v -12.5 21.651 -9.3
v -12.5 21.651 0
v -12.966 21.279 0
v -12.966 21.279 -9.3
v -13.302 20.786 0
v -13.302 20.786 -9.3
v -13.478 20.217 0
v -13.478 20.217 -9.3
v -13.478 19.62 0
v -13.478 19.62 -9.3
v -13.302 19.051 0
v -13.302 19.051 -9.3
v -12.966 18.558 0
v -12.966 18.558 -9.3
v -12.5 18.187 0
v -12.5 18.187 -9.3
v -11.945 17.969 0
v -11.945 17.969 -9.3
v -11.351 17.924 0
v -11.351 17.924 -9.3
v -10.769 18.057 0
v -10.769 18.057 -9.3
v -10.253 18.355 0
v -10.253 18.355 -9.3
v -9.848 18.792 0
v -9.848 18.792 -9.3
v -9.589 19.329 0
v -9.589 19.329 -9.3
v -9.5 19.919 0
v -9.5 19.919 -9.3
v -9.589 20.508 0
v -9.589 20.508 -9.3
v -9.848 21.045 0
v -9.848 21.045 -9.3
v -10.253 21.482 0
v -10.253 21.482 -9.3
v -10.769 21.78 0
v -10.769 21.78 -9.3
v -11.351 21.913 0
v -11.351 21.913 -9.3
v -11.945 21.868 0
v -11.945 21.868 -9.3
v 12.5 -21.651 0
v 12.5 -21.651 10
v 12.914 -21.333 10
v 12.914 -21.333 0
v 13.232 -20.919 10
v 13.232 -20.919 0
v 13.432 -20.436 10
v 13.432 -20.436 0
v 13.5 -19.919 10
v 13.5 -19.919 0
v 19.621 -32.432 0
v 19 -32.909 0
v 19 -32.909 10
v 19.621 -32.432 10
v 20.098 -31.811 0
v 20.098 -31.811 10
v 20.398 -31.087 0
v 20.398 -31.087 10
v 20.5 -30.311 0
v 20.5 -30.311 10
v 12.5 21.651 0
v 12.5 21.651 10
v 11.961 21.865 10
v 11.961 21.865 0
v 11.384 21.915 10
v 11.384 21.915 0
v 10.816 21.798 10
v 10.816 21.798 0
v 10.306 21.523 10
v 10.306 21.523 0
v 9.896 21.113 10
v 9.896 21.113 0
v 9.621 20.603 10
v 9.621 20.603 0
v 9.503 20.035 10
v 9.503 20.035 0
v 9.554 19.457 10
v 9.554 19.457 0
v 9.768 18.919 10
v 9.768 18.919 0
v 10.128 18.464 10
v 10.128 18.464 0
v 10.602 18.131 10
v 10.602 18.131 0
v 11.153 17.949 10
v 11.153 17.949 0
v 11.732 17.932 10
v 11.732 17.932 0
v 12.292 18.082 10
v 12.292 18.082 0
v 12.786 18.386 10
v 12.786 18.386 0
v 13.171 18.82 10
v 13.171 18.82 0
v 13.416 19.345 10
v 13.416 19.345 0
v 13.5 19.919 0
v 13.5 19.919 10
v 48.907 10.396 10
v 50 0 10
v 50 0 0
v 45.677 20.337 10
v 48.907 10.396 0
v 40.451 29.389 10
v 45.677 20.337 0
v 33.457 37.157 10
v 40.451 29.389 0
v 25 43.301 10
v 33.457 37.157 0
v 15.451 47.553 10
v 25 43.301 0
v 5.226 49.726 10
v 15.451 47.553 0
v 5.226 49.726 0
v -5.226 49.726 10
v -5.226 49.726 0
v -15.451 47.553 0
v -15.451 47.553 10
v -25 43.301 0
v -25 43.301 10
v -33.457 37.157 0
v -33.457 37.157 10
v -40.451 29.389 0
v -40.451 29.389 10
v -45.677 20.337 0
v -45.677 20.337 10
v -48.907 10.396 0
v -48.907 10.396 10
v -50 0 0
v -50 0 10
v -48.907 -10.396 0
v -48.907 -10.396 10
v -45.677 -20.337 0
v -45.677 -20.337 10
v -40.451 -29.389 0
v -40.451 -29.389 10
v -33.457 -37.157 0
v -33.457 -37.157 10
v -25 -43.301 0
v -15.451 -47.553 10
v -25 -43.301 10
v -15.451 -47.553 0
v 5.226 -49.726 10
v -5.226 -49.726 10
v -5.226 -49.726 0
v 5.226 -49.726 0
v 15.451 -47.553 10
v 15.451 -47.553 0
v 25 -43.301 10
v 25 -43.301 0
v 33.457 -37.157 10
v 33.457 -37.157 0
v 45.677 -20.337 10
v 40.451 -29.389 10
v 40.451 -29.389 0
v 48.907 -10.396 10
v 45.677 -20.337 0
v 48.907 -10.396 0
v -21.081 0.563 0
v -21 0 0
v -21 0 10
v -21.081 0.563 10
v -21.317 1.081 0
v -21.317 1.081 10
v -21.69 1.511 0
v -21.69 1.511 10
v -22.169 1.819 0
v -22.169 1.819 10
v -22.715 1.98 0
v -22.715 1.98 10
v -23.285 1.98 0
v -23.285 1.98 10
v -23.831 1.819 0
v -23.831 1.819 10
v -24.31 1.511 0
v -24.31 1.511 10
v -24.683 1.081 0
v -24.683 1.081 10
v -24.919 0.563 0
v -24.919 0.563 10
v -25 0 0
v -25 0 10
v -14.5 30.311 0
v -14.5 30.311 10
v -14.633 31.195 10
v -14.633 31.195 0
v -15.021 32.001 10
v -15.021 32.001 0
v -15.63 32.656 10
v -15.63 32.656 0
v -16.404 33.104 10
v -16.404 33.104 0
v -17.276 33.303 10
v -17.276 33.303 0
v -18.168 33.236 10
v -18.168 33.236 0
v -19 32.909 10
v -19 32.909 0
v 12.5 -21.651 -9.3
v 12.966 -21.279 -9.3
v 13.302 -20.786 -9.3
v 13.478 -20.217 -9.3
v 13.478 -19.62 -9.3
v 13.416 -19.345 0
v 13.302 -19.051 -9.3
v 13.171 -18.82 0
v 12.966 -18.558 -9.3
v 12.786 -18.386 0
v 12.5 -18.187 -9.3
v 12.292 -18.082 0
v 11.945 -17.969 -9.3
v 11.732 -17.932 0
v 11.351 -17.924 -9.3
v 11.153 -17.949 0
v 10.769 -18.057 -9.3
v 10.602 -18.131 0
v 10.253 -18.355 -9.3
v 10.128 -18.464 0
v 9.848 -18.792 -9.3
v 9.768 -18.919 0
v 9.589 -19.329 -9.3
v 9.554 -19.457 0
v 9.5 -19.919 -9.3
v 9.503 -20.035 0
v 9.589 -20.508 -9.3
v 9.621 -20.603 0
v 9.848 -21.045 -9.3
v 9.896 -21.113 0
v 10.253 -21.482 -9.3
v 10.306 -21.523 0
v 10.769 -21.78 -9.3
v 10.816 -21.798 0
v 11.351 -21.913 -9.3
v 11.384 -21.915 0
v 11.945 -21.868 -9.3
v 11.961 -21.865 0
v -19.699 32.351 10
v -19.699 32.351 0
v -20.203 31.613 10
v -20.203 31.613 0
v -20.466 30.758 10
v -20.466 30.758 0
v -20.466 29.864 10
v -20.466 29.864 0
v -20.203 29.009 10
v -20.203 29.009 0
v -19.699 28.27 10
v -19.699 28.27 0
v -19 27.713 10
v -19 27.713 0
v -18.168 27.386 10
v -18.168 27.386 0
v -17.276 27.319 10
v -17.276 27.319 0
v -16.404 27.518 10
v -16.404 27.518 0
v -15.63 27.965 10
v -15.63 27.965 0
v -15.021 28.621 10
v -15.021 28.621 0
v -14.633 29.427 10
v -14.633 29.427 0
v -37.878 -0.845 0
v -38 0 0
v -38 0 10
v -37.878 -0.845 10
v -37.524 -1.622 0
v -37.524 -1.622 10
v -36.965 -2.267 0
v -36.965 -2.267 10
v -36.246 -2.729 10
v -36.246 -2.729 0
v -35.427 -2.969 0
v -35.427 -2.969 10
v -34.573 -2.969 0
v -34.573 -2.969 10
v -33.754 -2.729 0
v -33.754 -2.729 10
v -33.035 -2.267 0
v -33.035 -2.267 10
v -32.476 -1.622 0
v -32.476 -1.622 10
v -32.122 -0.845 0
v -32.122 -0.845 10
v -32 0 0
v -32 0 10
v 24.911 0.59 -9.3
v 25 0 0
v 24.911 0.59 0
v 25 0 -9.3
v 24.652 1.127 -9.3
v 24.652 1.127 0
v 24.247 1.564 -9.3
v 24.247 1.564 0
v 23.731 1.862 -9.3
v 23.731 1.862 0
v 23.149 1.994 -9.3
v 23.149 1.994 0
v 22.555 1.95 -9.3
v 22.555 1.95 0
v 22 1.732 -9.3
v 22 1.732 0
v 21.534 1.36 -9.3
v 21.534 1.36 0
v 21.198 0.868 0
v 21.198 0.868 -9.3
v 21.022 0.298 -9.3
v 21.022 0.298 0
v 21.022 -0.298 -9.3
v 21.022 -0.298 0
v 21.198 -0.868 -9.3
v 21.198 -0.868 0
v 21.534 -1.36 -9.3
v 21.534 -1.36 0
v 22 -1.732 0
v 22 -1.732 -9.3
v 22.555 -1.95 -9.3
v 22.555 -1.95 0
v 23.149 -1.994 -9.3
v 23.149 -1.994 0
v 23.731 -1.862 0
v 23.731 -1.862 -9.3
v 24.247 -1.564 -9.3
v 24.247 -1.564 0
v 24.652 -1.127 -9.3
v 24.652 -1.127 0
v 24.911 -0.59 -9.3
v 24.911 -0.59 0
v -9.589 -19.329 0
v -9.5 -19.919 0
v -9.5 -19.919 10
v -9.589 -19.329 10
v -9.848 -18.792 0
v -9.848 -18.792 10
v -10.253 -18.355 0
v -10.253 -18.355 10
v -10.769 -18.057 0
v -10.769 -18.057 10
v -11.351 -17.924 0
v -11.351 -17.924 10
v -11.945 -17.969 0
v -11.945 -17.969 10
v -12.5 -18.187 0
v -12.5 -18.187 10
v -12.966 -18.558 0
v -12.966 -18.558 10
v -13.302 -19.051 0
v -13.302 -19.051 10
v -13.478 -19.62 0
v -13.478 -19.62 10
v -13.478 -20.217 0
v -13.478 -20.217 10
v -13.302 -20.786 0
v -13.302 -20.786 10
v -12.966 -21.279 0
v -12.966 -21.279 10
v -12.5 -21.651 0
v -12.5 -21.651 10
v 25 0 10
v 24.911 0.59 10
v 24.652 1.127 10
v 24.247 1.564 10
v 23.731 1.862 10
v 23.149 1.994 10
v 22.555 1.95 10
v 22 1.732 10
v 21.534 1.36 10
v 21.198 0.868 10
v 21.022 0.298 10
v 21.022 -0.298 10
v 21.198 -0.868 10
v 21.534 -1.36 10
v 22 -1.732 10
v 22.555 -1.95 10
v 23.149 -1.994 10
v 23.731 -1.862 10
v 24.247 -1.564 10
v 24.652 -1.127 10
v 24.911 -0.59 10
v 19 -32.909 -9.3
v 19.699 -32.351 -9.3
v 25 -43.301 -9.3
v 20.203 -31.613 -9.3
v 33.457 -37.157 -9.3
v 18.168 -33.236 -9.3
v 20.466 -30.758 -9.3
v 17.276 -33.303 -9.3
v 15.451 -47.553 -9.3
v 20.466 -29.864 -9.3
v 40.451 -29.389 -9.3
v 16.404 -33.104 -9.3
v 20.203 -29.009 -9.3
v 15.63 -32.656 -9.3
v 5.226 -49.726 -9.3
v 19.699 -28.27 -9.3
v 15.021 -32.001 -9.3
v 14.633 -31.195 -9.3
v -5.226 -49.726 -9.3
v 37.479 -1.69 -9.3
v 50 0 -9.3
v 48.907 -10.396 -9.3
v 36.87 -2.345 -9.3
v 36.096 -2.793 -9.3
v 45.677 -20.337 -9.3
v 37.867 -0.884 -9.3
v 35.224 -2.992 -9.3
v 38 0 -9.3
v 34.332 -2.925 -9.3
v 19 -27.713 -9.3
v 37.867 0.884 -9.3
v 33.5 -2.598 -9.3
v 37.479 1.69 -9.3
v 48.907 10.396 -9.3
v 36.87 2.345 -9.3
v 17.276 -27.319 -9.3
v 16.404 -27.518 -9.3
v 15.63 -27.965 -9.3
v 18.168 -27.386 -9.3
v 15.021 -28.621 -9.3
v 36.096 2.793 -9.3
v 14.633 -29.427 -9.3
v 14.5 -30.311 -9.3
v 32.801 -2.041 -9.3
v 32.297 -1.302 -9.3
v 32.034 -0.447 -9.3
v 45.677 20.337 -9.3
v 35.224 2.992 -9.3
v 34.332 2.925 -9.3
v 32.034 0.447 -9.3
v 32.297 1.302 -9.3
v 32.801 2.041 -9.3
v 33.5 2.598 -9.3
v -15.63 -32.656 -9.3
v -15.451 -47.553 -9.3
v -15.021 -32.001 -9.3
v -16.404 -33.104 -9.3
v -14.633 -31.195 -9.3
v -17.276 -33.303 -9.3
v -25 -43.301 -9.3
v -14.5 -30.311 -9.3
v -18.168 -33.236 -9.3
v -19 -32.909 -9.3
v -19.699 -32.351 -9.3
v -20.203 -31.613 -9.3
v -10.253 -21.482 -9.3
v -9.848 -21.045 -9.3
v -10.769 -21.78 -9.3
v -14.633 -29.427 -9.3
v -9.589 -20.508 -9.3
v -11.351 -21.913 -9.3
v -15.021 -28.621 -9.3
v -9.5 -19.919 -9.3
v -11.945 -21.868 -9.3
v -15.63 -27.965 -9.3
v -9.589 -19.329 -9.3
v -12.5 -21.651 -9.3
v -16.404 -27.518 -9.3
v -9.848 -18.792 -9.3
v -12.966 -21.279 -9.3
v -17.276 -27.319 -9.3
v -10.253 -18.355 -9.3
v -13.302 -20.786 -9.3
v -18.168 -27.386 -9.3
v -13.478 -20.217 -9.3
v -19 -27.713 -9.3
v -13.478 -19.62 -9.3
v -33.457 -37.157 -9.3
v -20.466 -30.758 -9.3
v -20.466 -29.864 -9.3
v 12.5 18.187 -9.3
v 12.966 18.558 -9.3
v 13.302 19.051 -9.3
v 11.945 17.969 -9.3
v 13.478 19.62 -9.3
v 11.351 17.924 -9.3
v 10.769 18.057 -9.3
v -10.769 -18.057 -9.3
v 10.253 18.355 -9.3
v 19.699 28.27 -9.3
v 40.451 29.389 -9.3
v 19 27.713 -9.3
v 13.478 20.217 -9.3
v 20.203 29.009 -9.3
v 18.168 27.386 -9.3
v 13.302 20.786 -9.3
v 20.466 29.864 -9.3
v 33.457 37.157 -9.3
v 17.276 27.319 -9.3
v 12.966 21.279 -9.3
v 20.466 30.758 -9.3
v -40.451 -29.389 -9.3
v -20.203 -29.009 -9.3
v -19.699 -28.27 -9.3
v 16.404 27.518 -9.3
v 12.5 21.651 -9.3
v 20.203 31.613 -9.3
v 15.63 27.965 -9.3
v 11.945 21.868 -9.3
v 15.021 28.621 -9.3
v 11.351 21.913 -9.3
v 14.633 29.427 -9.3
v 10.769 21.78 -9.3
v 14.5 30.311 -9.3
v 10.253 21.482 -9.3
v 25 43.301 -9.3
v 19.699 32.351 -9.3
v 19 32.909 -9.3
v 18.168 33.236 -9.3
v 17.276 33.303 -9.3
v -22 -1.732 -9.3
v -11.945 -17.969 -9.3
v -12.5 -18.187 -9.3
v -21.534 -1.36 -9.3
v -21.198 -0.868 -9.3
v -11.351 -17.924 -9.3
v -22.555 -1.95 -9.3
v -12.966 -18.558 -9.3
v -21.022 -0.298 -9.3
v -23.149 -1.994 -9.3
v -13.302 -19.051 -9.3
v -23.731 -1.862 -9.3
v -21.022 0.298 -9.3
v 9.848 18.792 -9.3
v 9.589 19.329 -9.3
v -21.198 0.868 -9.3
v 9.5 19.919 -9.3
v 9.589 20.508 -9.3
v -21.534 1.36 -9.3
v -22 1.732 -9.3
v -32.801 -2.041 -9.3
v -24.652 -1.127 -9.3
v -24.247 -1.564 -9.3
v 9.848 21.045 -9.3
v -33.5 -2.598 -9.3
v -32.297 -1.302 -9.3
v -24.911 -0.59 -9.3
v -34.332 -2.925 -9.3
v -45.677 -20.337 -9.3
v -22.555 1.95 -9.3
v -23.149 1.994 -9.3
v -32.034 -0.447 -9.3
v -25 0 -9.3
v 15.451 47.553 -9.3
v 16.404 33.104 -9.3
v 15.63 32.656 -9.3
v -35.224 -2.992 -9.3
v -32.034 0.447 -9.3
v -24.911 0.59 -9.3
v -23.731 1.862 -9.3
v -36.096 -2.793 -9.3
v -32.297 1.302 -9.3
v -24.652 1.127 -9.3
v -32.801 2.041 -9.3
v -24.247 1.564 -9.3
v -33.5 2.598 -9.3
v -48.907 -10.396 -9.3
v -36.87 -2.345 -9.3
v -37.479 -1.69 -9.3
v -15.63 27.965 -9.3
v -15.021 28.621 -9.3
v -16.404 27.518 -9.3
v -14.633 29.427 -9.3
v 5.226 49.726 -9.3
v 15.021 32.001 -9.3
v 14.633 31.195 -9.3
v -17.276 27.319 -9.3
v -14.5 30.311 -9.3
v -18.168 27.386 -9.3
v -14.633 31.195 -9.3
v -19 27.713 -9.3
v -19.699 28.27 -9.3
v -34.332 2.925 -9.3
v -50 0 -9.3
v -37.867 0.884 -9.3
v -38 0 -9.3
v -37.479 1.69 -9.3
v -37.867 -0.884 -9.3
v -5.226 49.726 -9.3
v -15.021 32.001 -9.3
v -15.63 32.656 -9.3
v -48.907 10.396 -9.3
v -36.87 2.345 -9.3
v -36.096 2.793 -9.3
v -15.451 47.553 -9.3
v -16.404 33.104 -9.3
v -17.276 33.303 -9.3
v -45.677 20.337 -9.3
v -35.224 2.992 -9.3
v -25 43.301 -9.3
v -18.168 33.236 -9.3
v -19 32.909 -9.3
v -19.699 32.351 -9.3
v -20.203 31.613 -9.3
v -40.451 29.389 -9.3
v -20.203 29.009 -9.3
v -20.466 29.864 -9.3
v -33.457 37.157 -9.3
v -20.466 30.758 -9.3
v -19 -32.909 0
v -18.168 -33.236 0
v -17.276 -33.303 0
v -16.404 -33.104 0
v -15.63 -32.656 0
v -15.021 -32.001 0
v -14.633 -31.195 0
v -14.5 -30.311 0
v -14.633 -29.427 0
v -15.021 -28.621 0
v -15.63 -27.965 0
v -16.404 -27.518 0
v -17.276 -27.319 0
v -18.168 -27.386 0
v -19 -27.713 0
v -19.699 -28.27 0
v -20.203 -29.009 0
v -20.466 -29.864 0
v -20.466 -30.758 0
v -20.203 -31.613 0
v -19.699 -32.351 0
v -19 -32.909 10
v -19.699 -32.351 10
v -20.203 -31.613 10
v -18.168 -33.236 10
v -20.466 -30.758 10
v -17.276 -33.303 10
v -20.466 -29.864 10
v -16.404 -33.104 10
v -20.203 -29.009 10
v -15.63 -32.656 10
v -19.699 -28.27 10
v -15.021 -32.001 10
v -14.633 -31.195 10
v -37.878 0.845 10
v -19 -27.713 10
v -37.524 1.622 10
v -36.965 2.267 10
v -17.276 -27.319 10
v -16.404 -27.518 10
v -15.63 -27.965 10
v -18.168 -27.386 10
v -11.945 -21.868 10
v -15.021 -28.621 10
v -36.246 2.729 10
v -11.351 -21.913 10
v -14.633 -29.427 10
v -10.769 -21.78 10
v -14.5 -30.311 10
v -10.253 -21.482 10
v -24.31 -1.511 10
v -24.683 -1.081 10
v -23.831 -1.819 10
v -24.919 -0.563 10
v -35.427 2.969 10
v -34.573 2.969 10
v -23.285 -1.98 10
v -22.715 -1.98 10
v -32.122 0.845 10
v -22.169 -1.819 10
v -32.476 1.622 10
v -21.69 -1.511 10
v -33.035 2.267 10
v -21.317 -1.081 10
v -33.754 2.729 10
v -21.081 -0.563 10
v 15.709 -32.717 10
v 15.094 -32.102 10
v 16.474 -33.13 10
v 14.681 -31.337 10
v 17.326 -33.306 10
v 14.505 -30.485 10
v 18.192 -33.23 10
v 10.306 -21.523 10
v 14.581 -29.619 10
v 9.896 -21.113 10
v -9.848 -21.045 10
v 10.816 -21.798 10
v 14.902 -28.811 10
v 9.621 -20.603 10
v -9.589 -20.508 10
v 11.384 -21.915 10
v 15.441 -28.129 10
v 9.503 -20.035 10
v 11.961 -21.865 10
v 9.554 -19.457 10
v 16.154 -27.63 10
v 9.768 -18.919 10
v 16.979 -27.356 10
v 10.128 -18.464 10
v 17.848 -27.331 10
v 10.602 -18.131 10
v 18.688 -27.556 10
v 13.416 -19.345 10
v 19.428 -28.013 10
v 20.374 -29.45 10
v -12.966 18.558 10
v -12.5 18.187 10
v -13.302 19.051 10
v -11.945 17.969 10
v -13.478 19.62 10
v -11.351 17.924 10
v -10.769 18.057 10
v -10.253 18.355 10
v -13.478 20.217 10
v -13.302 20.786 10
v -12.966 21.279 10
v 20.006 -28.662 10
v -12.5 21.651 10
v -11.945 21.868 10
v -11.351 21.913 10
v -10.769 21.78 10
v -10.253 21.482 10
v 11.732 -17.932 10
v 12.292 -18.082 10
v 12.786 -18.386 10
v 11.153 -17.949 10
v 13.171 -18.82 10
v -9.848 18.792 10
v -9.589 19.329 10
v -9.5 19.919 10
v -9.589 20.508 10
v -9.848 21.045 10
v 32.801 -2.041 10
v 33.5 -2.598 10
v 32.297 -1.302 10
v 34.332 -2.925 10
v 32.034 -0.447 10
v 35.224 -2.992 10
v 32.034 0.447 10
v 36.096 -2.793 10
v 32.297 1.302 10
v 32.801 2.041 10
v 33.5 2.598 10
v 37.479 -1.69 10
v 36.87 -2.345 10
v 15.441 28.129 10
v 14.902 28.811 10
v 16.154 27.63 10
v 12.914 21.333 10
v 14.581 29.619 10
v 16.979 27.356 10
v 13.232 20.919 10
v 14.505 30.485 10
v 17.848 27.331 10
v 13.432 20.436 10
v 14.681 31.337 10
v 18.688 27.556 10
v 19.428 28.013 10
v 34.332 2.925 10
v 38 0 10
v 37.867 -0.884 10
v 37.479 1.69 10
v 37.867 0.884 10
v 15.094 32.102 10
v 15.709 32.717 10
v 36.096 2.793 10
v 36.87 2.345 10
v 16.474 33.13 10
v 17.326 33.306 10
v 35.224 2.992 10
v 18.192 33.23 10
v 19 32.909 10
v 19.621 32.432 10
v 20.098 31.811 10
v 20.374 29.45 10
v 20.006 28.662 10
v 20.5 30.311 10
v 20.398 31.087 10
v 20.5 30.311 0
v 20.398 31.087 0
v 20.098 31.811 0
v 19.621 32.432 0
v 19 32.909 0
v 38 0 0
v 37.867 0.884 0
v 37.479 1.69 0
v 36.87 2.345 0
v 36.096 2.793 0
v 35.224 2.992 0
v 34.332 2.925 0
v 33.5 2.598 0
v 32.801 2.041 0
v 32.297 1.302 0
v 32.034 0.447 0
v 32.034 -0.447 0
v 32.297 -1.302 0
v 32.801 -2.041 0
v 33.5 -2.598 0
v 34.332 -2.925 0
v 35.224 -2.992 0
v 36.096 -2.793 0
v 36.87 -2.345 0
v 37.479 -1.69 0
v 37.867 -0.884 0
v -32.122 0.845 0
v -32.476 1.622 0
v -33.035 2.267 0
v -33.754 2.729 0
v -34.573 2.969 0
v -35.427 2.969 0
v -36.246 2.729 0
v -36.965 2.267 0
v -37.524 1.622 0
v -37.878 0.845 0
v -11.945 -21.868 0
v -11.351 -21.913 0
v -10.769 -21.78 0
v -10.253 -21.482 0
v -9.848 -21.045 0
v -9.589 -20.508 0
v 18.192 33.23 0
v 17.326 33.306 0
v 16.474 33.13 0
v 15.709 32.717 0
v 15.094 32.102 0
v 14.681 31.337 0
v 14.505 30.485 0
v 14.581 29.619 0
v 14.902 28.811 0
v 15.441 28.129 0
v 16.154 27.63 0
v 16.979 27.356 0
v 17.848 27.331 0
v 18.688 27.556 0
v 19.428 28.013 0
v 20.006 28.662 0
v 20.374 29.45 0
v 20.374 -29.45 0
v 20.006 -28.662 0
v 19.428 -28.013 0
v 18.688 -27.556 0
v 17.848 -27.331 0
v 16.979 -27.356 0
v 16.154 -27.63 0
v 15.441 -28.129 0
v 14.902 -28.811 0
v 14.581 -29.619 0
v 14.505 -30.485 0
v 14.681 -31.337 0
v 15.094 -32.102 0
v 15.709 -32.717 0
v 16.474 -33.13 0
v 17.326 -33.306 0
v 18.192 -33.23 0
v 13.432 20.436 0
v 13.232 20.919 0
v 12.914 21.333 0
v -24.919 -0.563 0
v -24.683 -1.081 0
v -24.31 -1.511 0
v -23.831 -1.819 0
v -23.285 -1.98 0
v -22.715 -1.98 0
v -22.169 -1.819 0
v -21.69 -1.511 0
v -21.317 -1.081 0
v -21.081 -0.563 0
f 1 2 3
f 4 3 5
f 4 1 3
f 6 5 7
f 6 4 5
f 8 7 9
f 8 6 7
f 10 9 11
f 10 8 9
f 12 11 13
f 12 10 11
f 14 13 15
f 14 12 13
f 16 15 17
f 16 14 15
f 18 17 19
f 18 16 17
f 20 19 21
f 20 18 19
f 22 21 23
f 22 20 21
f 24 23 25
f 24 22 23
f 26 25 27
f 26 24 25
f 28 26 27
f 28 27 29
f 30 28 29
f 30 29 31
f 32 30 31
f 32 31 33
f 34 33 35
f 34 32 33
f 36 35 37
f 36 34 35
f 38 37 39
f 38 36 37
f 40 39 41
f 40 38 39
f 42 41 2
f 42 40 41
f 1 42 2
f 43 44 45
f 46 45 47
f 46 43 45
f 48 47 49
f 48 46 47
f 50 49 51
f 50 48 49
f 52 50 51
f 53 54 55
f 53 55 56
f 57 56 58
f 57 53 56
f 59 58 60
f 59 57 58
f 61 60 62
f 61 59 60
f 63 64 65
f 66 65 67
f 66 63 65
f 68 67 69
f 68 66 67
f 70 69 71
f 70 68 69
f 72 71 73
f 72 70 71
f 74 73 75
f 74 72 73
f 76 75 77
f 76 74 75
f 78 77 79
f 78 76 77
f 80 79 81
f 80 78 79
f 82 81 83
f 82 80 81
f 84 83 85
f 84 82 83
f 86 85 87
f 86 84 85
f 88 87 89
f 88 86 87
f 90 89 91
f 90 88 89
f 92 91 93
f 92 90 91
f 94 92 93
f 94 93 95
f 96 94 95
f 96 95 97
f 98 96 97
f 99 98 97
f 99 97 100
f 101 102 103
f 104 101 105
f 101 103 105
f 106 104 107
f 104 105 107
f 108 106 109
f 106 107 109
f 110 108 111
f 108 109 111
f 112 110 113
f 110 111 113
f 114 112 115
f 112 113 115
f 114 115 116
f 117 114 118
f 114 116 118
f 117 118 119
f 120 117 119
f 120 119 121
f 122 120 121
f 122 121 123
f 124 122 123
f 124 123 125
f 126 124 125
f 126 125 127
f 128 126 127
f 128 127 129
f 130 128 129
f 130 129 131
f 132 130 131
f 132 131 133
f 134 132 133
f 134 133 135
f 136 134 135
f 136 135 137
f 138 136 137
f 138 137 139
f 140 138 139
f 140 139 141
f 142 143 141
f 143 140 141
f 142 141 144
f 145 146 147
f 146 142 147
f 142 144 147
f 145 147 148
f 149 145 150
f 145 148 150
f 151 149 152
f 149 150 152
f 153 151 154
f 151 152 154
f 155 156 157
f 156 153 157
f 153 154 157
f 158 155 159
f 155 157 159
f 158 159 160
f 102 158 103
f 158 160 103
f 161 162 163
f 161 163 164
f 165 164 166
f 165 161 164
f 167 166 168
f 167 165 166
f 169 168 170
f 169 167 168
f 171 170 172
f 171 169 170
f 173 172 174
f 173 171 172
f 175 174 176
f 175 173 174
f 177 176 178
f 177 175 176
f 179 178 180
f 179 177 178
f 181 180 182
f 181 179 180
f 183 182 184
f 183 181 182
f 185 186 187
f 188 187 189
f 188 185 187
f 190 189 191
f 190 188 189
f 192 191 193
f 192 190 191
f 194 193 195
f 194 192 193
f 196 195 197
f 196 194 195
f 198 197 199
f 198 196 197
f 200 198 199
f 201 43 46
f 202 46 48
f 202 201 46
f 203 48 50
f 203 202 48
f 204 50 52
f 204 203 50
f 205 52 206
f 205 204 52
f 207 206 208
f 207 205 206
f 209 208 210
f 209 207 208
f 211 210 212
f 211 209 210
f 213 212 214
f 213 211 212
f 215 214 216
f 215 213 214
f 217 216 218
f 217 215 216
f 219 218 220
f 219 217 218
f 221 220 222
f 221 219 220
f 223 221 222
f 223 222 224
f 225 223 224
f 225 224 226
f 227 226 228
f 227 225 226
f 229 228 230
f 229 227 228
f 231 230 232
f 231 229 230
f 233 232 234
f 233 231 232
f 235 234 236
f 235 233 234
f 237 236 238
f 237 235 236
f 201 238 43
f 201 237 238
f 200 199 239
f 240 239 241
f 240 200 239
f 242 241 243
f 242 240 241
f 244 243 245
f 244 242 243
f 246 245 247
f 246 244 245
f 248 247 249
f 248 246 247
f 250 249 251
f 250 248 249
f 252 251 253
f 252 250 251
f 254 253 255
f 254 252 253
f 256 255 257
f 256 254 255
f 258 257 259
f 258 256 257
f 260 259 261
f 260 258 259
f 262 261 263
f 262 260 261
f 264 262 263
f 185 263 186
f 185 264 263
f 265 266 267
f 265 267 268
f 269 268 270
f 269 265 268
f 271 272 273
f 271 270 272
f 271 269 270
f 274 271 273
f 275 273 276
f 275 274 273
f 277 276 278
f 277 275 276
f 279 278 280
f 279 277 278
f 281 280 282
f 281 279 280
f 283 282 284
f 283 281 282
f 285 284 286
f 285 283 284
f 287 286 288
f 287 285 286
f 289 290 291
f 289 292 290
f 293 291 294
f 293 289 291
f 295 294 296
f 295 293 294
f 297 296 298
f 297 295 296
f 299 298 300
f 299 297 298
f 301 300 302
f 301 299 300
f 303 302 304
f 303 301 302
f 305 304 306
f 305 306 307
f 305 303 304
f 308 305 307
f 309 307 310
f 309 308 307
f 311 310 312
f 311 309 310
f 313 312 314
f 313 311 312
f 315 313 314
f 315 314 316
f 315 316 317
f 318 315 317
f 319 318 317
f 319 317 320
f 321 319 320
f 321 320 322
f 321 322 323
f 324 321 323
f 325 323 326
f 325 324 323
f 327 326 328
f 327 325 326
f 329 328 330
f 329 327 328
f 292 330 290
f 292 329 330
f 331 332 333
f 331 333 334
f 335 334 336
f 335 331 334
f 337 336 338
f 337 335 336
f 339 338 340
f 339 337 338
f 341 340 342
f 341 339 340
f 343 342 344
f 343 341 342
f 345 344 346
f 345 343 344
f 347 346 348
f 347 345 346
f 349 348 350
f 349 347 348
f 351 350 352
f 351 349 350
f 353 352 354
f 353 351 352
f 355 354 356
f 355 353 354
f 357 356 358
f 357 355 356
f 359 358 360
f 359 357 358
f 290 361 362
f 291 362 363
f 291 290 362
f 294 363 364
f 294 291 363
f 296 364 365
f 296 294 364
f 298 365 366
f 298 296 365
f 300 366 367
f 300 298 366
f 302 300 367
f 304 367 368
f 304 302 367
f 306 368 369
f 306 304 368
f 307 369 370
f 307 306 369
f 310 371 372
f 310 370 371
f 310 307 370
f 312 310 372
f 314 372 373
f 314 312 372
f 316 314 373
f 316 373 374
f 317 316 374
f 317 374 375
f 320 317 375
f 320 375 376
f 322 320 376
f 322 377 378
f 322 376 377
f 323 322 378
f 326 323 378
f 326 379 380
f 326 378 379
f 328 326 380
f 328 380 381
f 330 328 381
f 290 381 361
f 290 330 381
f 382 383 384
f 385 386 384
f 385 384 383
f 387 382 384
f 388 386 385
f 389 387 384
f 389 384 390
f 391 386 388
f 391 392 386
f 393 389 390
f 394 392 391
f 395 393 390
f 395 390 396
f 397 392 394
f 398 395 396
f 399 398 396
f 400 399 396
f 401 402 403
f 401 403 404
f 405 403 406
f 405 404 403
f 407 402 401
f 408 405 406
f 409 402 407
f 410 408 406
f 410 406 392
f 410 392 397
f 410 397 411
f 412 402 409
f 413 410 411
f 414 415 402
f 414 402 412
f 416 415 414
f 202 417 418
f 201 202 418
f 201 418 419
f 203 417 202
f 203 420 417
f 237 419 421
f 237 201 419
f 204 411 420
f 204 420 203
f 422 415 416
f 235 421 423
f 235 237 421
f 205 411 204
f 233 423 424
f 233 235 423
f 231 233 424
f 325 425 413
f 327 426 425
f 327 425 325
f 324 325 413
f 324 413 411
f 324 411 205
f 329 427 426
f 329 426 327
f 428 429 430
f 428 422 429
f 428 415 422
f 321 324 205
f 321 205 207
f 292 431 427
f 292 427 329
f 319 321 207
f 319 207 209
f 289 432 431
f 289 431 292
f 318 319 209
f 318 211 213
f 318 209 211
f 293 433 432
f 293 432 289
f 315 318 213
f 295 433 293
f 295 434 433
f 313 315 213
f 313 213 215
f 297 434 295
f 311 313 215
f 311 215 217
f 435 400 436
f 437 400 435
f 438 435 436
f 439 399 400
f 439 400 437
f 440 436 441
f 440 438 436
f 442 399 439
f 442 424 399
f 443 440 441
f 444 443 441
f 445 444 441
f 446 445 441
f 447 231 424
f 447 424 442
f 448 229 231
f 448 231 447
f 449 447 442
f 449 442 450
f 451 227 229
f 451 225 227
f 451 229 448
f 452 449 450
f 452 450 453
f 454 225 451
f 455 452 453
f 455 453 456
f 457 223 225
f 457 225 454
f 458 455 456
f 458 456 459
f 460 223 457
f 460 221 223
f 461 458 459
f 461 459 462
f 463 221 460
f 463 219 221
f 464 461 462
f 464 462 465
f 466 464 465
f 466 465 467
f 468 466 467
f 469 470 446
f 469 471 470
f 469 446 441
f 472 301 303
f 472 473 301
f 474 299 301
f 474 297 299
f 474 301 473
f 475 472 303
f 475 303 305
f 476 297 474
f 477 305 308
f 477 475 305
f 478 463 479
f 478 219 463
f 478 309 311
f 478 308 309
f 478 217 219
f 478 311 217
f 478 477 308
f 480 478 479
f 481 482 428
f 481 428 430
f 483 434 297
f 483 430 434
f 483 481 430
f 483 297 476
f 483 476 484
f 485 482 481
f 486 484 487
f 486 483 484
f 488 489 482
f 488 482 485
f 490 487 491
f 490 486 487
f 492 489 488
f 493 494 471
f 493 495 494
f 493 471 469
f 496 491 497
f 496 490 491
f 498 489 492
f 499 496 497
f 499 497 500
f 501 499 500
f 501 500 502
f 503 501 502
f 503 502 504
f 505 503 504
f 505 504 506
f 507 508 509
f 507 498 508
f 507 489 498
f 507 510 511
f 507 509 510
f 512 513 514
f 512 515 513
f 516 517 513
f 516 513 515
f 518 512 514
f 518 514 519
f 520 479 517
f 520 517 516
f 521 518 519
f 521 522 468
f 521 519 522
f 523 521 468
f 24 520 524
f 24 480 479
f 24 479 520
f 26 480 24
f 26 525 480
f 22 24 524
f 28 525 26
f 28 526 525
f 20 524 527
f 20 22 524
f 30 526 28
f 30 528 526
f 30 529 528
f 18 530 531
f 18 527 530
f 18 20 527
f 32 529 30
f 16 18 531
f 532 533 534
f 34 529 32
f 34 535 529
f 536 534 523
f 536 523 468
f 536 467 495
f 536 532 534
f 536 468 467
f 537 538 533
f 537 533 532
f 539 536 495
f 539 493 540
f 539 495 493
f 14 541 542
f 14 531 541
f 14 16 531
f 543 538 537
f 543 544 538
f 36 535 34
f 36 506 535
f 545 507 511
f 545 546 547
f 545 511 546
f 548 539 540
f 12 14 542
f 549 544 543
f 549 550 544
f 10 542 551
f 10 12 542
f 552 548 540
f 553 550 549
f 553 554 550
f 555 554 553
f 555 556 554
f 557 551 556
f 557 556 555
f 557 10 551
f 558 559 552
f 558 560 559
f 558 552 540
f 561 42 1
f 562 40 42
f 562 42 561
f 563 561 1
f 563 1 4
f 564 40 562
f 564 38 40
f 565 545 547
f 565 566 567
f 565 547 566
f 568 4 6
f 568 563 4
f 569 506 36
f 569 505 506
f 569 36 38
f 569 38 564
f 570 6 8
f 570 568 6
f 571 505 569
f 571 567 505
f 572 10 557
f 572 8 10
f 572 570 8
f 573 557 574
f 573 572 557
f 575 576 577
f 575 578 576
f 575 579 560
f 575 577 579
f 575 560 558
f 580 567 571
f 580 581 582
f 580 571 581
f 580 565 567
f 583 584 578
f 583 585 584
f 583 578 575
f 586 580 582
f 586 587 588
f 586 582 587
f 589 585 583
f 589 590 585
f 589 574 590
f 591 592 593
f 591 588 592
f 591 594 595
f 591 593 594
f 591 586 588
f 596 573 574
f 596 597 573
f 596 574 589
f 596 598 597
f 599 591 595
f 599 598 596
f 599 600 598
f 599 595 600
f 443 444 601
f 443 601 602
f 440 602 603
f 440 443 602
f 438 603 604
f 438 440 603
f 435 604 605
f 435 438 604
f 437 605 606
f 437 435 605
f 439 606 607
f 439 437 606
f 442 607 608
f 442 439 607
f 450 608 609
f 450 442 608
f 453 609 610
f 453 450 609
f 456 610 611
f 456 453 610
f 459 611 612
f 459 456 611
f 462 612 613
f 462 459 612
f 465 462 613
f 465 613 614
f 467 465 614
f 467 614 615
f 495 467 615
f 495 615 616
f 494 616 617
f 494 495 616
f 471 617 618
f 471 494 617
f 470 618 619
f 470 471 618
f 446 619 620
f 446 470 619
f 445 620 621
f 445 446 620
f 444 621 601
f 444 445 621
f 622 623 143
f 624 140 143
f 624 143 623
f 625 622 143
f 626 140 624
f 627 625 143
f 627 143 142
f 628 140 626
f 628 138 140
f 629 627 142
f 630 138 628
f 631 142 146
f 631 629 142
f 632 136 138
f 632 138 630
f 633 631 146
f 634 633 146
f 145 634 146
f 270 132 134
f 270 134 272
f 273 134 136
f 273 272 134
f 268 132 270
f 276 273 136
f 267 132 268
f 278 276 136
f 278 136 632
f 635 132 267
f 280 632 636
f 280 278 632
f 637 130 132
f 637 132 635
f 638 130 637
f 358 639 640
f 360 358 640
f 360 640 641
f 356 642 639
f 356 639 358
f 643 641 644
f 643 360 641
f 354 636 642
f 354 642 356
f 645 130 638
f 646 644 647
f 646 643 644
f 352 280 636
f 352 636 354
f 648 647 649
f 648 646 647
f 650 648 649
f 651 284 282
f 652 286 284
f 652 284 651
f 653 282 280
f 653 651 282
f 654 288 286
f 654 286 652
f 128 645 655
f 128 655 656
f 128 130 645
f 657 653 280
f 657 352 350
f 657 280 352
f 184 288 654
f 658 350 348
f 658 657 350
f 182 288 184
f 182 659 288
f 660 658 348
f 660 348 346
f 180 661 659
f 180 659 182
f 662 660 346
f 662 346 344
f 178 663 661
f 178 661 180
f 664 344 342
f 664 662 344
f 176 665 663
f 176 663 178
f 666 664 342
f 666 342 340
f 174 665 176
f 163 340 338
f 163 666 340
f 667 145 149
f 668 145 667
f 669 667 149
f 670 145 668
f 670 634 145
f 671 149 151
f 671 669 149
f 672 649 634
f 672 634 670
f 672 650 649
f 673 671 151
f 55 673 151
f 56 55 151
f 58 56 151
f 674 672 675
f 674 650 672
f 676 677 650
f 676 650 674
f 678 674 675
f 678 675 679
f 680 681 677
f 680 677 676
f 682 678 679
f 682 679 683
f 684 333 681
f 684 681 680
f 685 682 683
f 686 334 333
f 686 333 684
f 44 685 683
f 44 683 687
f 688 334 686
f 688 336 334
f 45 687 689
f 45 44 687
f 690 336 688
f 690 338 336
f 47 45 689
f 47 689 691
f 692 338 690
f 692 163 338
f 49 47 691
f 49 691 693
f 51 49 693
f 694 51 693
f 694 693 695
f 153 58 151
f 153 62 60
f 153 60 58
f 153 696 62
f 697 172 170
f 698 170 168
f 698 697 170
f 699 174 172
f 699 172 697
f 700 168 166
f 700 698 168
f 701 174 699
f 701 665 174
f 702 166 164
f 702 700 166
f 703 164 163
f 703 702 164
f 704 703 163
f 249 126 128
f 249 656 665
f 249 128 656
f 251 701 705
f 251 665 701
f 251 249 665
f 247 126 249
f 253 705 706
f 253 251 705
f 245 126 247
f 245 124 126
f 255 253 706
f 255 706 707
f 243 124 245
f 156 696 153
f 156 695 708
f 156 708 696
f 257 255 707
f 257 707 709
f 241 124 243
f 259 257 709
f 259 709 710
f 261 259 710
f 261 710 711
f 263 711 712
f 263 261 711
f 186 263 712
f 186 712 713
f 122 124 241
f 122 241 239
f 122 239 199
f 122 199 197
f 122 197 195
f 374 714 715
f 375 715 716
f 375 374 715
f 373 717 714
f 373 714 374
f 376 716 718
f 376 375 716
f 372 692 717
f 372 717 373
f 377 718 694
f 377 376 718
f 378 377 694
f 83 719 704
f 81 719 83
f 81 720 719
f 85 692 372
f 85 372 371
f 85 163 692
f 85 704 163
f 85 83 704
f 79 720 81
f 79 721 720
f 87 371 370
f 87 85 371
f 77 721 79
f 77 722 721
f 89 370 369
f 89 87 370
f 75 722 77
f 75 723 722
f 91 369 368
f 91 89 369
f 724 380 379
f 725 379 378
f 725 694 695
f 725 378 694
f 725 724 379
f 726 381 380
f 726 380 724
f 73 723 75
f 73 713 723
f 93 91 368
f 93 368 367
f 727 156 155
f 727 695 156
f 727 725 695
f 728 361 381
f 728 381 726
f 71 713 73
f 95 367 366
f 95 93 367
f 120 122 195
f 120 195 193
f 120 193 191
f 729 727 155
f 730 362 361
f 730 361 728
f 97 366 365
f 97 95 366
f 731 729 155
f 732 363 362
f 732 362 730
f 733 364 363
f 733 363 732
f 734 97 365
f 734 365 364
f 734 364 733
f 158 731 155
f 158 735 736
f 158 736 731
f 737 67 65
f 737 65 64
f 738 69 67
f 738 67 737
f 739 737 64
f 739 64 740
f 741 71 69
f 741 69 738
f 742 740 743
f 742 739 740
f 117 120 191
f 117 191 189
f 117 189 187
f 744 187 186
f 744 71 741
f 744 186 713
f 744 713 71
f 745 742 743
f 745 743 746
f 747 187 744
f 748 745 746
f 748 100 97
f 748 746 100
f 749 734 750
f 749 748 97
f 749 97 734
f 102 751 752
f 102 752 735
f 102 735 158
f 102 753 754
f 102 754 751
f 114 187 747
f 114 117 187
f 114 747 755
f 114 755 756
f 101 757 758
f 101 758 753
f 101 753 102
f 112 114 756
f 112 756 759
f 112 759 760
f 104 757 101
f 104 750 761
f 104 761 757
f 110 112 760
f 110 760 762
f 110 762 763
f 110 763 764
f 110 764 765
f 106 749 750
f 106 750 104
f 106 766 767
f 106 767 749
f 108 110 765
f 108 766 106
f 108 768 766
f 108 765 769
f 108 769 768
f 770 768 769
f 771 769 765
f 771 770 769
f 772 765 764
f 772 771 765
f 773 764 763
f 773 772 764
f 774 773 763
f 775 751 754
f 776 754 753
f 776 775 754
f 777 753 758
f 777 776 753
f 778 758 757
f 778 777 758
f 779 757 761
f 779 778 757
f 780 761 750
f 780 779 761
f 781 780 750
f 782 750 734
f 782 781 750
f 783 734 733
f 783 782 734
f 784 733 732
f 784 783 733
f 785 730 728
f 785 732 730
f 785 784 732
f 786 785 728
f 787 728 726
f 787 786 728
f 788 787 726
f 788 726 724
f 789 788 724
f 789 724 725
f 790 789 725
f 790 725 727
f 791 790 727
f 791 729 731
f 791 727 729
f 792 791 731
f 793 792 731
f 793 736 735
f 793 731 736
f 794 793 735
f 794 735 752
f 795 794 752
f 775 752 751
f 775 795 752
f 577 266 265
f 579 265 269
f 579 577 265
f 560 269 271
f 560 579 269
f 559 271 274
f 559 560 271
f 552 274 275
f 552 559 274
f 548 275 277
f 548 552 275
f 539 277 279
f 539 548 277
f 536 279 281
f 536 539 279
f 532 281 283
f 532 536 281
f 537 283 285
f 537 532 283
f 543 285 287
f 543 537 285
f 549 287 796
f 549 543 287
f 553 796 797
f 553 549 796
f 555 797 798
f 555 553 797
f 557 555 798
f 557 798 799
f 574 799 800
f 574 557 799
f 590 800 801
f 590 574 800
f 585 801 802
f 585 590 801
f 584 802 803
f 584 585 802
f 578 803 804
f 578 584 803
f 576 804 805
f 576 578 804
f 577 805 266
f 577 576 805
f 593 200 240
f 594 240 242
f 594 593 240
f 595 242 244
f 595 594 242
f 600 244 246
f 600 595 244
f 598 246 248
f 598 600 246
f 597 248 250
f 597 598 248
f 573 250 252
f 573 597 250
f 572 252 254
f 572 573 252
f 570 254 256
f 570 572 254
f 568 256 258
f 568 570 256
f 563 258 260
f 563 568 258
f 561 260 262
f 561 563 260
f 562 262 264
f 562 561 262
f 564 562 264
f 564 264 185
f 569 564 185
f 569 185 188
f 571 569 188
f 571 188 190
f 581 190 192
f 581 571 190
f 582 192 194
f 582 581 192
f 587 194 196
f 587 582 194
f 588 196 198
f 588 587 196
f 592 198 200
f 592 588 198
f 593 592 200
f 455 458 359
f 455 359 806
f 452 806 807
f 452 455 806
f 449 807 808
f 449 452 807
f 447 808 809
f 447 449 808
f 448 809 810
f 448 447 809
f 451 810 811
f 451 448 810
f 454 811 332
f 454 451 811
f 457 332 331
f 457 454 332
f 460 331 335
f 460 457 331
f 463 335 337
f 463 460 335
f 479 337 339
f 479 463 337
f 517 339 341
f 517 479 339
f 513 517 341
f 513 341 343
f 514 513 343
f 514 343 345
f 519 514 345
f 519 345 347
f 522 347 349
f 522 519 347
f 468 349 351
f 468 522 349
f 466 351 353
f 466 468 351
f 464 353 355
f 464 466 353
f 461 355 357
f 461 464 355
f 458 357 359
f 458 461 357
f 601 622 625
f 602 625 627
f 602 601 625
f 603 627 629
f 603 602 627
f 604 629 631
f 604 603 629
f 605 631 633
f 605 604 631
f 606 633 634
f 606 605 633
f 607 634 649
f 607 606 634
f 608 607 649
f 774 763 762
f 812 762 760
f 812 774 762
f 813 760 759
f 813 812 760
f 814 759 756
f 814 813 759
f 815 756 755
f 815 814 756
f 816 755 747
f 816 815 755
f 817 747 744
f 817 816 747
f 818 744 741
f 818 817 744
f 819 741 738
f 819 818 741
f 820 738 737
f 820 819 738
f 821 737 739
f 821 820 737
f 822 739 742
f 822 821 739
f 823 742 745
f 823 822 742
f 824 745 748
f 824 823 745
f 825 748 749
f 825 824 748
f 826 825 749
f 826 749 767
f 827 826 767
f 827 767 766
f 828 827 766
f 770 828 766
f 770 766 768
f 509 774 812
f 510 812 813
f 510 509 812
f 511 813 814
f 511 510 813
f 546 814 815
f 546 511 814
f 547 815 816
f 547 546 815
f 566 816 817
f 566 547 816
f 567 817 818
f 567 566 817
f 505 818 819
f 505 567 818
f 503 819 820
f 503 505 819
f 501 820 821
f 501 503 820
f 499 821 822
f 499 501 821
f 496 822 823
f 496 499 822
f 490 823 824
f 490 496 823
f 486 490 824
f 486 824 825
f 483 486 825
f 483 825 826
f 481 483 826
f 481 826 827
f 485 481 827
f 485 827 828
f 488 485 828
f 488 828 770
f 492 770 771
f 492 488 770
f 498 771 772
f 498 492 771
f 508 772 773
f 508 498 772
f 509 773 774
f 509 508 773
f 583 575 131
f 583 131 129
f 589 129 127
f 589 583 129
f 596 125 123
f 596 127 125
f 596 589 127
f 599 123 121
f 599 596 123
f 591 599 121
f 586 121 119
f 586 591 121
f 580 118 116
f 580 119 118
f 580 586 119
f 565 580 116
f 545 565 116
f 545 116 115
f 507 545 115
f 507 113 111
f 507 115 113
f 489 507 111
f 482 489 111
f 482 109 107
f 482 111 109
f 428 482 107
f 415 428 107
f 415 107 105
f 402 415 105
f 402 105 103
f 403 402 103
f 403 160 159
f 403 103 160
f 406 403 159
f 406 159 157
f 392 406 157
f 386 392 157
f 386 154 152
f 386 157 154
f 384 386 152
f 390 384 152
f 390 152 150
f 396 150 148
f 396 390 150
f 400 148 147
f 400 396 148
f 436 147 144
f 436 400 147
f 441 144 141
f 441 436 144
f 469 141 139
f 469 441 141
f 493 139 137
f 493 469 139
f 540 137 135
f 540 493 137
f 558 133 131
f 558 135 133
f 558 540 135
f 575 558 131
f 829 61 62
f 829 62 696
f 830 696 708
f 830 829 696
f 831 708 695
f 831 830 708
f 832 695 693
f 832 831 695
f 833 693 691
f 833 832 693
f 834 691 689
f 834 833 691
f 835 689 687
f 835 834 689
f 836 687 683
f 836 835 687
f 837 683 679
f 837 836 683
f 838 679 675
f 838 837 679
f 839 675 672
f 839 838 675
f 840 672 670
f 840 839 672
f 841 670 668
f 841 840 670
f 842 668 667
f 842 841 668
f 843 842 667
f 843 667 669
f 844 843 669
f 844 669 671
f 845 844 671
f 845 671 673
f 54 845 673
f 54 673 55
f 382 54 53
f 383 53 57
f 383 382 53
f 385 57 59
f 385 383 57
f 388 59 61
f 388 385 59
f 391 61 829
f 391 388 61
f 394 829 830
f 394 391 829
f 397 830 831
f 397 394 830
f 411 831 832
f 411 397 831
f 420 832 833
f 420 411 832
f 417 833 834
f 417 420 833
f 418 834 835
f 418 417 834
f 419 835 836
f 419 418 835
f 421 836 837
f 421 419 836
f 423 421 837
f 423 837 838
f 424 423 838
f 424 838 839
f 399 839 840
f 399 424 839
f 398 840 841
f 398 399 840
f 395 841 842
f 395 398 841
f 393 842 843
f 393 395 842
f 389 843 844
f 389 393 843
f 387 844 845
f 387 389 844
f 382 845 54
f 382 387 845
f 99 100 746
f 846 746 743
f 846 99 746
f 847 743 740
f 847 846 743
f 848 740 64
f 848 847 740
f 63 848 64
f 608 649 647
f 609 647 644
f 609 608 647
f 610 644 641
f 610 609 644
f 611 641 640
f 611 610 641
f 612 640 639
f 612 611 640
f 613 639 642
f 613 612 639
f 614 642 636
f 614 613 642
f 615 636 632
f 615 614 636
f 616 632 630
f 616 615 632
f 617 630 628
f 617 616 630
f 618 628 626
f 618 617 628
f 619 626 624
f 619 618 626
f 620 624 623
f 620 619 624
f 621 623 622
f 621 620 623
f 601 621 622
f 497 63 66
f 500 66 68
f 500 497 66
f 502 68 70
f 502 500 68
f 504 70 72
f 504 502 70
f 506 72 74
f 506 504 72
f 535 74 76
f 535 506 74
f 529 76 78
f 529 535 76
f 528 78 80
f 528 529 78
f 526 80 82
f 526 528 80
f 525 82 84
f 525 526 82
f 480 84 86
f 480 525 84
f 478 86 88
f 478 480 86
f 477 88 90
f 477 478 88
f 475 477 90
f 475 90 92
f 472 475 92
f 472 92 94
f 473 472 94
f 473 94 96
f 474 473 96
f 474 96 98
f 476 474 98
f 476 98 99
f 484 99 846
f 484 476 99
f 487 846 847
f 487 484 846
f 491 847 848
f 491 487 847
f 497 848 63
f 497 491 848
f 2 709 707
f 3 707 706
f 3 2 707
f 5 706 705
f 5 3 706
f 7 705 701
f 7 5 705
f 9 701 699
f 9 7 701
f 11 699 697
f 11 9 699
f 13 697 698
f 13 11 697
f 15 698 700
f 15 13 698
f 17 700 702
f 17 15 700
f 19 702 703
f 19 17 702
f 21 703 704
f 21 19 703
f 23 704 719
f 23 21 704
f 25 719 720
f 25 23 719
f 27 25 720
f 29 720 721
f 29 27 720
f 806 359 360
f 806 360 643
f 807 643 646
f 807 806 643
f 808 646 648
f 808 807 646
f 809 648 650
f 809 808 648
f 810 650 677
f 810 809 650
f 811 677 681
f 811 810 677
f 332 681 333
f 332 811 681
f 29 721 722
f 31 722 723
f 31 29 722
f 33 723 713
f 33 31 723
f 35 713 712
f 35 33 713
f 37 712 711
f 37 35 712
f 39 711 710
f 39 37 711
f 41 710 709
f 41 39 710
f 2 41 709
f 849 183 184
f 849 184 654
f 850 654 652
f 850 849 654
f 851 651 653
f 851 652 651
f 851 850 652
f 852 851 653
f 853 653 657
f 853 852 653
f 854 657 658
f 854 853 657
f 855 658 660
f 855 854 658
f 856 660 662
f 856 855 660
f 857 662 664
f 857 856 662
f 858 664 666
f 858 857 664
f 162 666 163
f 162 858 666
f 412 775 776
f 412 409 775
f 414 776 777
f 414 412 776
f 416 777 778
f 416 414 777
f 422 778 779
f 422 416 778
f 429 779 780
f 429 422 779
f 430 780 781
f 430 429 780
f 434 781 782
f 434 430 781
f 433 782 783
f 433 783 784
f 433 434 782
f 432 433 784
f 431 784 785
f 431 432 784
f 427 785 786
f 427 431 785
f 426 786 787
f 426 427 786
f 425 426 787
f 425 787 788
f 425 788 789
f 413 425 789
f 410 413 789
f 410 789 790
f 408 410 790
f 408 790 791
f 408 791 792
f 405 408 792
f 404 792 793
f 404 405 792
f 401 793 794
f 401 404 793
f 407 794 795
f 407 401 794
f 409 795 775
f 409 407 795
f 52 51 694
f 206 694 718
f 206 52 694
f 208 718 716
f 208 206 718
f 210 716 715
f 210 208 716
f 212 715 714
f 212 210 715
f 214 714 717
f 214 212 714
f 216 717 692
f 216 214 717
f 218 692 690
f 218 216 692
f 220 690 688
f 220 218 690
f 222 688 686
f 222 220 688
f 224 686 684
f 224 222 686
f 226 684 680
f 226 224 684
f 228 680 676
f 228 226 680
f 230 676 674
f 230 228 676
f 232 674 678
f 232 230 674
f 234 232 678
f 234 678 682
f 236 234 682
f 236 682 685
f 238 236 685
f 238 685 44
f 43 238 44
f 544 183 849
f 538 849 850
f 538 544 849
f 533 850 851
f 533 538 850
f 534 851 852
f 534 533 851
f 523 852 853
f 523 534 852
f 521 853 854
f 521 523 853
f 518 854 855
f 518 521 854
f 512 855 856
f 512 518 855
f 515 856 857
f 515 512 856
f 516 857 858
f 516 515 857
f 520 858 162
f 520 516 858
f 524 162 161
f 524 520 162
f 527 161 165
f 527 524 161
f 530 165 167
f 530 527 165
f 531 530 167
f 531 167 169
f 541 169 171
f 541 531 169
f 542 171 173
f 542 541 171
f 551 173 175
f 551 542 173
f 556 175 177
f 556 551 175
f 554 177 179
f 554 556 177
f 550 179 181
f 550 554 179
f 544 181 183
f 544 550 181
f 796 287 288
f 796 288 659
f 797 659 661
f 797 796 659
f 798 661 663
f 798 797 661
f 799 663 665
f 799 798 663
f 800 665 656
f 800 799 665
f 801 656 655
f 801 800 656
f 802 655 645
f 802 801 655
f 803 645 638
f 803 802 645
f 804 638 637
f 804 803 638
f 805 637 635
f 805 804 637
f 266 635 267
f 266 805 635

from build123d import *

# Parameters (mm, degrees)
SKETCH_1_R               = 50
SKETCH_1_R_2             = 3
SKETCH_1_R_3             = 2
EXTRUDE_1_DEPTH          = 20
SKETCH_3_R               = 82.232653787
CUT_EXTRUDE_1_DEPTH      = 10
EXTRUDE_START            = 9.3
SKETCH_4_R               = 50
EXTRUDE_2_DEPTH          = 9.3
CUT_EXTRUDE_START        = -52
SKETCH_5_R               = 3
SKETCH_5_R_2             = 2
CUT_EXTRUDE_2_DEPTH      = 52
PATTERN_CIRCULAR_1_COUNT = 6


with BuildPart() as part:
    # 草图1 → 凸台-拉伸1 (new body)
    with BuildSketch(Plane.XY):
        Circle(SKETCH_1_R)
        with Locations((-35, 0)):
            Circle(SKETCH_1_R_2, mode=Mode.SUBTRACT)
        with Locations((-17.5, 30.310889132)):
            Circle(SKETCH_1_R_2, mode=Mode.SUBTRACT)
        with Locations((17.5, 30.310889132)):
            Circle(SKETCH_1_R_2, mode=Mode.SUBTRACT)
        with Locations((35, 0)):
            Circle(SKETCH_1_R_2, mode=Mode.SUBTRACT)
        with Locations((17.5, -30.310889132)):
            Circle(SKETCH_1_R_2, mode=Mode.SUBTRACT)
        with Locations((-17.5, -30.310889132)):
            Circle(SKETCH_1_R_2, mode=Mode.SUBTRACT)
        with Locations((-23, 0)):
            Circle(SKETCH_1_R_3, mode=Mode.SUBTRACT)
        with Locations((-11.5, 19.918584287)):
            Circle(SKETCH_1_R_3, mode=Mode.SUBTRACT)
        with Locations((11.5, 19.918584287)):
            Circle(SKETCH_1_R_3, mode=Mode.SUBTRACT)
        with Locations((23, 0)):
            Circle(SKETCH_1_R_3, mode=Mode.SUBTRACT)
        with Locations((11.5, -19.918584287)):
            Circle(SKETCH_1_R_3, mode=Mode.SUBTRACT)
        with Locations((-11.5, -19.918584287)):
            Circle(SKETCH_1_R_3, mode=Mode.SUBTRACT)
    extrude(amount=EXTRUDE_1_DEPTH)

    # 草图3 → 切除-拉伸1 (cut)
    with BuildSketch(Plane.XY.offset(20)):
        Circle(SKETCH_3_R)
    extrude(amount=-CUT_EXTRUDE_1_DEPTH, mode=Mode.SUBTRACT)

    # 草图4 → 凸台-拉伸2 (add)
    with BuildSketch(Plane(origin=(0, 0, 0), x_dir=(-1, 0, 0), z_dir=(0, 0, -1)).offset(EXTRUDE_START)):
        Circle(SKETCH_4_R)
    extrude(amount=-EXTRUDE_2_DEPTH)

    # 草图5 → 切除-拉伸2 (cut)
    with BuildSketch(Plane.XY.offset(10).offset(CUT_EXTRUDE_START)):
        with Locations(Location((-35, 0, 0), (0, 0, 180))):
            Circle(SKETCH_5_R)
        with Locations(Location((-23, 0, 0), (0, 0, 180))):
            Circle(SKETCH_5_R_2)
    cut_extrude_2 = extrude(amount=CUT_EXTRUDE_2_DEPTH, mode=Mode.SUBTRACT)

    # 阵列(圆周)1: 切除-拉伸2 ×6 about axis
    pattern_circular_1_axis = Axis((0, 0, 20), (0, 0, -1))
    for i in range(1, PATTERN_CIRCULAR_1_COUNT):
        add(cut_extrude_2.rotate(pattern_circular_1_axis, i * 360 / PATTERN_CIRCULAR_1_COUNT), mode=Mode.SUBTRACT)


solid = part.part
